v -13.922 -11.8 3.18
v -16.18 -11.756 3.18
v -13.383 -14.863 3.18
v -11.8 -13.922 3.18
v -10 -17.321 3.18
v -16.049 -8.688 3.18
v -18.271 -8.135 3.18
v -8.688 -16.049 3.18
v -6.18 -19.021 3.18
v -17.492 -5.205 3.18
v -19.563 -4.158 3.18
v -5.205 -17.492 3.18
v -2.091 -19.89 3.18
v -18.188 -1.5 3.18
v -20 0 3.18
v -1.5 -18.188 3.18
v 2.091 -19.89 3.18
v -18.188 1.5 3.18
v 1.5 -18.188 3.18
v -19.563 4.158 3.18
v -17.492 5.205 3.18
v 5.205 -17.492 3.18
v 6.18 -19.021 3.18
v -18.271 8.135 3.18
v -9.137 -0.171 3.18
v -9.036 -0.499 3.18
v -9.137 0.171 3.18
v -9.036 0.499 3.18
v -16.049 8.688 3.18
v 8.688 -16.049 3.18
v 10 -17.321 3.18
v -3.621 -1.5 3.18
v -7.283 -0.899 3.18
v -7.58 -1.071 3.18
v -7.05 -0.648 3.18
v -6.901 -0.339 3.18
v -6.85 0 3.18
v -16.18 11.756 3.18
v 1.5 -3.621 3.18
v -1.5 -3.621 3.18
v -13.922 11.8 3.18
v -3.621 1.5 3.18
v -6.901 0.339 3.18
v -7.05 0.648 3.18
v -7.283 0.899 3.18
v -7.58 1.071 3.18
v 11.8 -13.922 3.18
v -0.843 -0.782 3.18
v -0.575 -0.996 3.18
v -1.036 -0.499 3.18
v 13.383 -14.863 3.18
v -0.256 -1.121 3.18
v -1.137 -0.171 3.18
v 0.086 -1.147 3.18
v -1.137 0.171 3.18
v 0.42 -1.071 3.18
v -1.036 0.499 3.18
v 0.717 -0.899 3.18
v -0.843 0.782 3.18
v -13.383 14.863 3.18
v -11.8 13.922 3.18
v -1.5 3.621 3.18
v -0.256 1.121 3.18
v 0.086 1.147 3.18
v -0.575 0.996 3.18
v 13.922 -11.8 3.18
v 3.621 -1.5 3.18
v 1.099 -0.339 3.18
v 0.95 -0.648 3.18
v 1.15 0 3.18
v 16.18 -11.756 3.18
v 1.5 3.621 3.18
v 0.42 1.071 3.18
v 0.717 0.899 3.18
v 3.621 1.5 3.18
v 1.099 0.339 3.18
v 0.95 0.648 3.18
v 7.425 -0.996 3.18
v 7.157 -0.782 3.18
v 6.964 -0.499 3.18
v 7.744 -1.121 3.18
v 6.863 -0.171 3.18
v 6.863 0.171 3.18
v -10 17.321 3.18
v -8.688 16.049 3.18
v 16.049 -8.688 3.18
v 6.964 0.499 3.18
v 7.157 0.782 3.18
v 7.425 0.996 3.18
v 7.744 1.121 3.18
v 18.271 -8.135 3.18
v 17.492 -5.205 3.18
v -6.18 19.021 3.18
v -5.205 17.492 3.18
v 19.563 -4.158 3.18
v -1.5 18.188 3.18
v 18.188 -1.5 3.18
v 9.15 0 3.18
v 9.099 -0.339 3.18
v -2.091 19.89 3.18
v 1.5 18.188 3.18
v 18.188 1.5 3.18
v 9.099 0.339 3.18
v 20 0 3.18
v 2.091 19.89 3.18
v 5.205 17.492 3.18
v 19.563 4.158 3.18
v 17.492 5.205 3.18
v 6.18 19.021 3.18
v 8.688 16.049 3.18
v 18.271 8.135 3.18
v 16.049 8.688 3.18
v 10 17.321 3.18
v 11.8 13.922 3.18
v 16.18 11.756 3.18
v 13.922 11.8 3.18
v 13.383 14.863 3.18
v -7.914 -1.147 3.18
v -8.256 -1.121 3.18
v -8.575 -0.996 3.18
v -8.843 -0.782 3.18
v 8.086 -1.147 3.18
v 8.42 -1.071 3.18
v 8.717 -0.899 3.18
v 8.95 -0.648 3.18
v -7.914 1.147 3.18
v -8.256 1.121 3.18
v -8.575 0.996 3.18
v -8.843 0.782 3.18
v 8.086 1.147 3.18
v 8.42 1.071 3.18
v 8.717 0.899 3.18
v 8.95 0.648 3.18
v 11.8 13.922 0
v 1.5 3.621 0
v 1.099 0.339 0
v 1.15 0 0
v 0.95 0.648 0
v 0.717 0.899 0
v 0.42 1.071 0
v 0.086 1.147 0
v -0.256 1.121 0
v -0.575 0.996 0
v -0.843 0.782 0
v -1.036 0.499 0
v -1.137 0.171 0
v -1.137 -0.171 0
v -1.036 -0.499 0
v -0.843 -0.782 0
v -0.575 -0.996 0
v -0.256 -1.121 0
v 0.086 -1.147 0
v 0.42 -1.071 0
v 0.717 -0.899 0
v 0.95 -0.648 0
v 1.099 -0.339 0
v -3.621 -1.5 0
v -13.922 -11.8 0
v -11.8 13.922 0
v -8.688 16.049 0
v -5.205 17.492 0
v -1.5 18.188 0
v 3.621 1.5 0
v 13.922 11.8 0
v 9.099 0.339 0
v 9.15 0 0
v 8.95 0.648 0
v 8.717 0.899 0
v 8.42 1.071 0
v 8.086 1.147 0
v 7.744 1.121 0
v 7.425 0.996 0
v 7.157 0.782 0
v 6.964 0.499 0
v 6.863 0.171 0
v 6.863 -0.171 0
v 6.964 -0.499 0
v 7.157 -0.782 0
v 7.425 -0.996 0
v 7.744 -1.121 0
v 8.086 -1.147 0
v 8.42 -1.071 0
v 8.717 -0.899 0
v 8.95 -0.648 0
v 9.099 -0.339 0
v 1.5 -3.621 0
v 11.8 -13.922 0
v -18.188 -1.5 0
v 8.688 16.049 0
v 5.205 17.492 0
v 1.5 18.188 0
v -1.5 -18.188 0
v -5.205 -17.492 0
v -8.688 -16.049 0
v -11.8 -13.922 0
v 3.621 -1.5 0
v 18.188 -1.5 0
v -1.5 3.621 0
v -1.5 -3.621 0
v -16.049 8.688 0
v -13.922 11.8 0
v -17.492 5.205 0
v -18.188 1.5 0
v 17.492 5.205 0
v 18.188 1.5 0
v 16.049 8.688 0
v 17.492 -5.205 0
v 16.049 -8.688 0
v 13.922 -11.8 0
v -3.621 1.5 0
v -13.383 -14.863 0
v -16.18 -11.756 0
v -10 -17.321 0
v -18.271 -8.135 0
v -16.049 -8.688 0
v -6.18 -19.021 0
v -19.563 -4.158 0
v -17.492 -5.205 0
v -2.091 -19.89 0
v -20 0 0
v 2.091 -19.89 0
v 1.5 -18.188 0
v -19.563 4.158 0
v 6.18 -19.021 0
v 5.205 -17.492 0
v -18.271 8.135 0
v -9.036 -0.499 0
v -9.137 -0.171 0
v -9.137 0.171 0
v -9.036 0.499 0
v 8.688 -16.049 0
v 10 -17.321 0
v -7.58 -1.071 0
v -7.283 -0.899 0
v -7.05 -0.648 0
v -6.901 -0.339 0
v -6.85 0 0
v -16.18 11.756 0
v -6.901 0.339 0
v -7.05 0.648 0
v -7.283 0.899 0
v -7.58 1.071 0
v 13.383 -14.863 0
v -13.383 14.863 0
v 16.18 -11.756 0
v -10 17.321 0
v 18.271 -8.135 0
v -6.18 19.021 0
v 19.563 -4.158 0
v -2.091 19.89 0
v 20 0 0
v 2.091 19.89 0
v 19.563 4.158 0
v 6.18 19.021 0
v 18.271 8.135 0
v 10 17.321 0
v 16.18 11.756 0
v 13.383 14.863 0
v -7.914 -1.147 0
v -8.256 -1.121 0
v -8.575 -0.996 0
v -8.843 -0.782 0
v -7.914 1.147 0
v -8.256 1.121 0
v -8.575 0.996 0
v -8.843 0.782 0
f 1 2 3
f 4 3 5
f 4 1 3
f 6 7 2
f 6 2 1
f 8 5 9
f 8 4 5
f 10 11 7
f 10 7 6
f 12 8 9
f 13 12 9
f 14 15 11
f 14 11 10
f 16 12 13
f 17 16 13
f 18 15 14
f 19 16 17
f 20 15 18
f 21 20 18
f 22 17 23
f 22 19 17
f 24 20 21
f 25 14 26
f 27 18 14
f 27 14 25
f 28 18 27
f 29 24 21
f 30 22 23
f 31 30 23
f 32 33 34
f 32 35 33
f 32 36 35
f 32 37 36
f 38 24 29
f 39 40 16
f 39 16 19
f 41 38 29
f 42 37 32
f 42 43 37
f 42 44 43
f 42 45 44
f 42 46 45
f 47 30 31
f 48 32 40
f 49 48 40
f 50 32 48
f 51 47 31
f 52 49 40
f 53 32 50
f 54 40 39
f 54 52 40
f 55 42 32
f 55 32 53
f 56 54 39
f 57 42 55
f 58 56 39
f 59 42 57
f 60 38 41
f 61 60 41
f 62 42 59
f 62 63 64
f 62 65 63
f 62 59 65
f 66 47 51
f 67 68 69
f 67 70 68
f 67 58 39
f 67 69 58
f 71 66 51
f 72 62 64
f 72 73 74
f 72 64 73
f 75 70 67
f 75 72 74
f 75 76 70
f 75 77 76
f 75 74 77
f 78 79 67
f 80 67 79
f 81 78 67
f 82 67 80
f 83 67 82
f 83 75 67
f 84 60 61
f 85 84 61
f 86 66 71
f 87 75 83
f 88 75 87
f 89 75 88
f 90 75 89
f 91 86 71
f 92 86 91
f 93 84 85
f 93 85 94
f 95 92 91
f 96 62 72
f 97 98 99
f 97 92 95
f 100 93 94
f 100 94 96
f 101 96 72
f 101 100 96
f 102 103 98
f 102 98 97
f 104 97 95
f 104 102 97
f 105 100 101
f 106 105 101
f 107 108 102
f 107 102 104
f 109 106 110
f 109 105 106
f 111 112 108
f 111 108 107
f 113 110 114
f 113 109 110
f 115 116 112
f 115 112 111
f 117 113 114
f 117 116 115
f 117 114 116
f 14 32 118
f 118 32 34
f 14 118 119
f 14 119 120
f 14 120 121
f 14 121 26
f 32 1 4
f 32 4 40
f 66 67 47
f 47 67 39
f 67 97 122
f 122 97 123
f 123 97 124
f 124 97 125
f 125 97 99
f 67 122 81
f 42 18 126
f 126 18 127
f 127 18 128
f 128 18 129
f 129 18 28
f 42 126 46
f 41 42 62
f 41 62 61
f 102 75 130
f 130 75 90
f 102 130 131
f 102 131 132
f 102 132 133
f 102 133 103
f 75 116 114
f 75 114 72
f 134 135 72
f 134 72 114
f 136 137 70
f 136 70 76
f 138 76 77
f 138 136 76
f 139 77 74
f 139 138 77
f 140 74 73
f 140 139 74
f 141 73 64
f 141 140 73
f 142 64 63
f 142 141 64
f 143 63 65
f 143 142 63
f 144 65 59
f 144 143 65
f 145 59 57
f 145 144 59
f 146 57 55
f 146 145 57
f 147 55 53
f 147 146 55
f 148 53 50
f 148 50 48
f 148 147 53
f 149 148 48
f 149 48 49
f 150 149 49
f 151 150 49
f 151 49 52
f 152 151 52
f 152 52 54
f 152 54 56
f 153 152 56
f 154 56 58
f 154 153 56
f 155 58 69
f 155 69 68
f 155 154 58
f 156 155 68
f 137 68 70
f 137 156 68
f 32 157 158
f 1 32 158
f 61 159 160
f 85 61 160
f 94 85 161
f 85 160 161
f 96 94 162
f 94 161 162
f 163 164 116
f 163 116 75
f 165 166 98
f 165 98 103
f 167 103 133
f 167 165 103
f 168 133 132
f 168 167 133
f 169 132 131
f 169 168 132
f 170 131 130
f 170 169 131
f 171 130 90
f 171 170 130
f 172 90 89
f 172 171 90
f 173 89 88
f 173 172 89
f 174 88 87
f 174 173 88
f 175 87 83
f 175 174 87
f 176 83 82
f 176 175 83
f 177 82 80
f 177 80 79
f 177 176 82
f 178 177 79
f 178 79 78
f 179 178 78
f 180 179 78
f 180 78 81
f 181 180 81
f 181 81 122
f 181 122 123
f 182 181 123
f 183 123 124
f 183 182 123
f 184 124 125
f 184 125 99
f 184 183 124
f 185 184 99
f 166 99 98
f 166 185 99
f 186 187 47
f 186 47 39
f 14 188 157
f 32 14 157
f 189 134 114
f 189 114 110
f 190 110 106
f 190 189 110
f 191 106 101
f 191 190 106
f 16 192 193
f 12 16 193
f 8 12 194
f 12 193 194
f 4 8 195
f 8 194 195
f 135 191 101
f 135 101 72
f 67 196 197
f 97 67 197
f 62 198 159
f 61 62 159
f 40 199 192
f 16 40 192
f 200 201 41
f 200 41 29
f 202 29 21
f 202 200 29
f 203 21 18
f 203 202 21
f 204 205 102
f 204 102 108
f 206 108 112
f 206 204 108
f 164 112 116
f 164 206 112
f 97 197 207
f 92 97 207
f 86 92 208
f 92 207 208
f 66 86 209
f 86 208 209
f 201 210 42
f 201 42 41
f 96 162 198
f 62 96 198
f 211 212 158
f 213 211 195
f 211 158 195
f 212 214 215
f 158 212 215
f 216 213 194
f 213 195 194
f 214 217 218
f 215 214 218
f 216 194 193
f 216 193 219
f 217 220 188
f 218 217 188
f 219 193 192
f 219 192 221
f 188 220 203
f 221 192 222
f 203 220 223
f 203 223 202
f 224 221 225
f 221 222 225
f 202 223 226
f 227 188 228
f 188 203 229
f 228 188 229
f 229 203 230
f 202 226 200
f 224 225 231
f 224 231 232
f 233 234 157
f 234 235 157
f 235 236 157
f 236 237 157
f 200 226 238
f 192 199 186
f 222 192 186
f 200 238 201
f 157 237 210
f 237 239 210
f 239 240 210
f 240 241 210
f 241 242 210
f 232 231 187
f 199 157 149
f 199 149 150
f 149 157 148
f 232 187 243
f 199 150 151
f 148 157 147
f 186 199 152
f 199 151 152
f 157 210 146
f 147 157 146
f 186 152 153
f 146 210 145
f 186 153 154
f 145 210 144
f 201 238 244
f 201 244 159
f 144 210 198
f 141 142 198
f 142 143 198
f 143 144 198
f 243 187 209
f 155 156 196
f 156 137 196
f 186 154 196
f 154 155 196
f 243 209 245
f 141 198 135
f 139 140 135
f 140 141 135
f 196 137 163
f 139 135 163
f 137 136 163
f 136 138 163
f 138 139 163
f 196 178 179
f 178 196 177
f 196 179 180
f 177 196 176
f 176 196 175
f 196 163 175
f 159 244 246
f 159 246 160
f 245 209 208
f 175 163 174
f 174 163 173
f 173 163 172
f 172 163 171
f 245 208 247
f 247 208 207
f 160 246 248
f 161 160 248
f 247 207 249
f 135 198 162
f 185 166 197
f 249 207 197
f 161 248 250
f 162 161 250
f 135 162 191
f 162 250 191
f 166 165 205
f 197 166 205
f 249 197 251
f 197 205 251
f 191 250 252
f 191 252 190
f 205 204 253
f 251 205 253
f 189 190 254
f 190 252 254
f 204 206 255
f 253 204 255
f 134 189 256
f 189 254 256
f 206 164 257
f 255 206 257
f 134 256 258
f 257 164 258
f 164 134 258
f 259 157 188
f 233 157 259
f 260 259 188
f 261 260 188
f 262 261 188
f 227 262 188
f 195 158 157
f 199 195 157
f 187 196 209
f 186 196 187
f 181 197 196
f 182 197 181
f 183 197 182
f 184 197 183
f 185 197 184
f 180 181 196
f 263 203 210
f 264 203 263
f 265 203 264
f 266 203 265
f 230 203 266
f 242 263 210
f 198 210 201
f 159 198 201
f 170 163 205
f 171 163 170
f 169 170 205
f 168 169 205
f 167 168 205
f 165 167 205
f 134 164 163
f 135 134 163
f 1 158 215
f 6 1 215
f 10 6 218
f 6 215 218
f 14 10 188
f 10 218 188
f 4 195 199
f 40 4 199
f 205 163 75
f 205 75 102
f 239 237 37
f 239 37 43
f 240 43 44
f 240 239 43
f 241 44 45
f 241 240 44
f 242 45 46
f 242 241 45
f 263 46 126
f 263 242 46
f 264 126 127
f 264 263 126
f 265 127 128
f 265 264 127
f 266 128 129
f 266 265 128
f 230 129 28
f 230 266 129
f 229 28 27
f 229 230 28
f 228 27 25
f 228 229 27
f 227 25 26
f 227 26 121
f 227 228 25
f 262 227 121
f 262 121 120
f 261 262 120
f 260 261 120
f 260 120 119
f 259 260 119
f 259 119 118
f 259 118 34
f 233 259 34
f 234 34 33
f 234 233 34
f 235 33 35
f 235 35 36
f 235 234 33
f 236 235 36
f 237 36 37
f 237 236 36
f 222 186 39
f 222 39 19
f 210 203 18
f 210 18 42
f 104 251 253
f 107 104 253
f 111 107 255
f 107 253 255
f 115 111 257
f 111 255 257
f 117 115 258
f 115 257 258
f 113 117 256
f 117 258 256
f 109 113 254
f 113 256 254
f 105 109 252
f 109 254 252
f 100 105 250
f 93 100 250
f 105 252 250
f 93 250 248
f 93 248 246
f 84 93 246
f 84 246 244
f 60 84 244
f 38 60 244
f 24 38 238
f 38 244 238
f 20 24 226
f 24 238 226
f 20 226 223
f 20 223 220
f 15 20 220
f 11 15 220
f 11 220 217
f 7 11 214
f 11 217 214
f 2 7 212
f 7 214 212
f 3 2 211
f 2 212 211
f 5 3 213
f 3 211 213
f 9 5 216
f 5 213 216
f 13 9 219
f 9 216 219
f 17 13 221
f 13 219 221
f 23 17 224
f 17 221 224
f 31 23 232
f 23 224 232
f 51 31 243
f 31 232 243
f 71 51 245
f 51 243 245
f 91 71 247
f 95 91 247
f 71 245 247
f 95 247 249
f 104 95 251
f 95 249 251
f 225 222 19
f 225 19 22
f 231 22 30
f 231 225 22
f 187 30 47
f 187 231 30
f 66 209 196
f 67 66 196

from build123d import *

# Parameters (mm, degrees)
SKETCH1_R           = 20
SKETCH1_R_2         = 1.15
BOSS_EXTRUDE1_DEPTH = 3.18


with BuildPart() as part:
    # Sketch1 → Boss-Extrude1 (new body)
    with BuildSketch(Plane.XY):
        Circle(SKETCH1_R)
        Circle(SKETCH1_R_2, mode=Mode.SUBTRACT)
        with Locations((-8, 0)):
            Circle(SKETCH1_R_2, mode=Mode.SUBTRACT)
        with Locations((8, 0)):
            Circle(SKETCH1_R_2, mode=Mode.SUBTRACT)
        with BuildLine():
            Line((-1.5, 18.188251703), (-1.5, 3.621320344))
            Line((-1.5, 3.621320344), (-11.800375945, 13.921696289))
            ThreePointArc((-11.800375945, 13.921696289), (-6.983972641, 16.860801468), (-1.5, 18.188251703))
        make_face(mode=Mode.SUBTRACT)
        with BuildLine():
            Line((-1.5, -3.621320344), (-1.5, -18.188251703))
            ThreePointArc((-1.5, -18.188251703), (-6.983972641, -16.860801468), (-11.800375945, -13.921696289))
            Line((-11.800375945, -13.921696289), (-1.5, -3.621320344))
        make_face(mode=Mode.SUBTRACT)
        with BuildLine():
            Line((1.5, -3.621320344), (1.5, -18.188251703))
            ThreePointArc((1.5, -18.188251703), (6.983972641, -16.860801468), (11.800375945, -13.921696289))
            Line((11.800375945, -13.921696289), (1.5, -3.621320344))
        make_face(mode=Mode.SUBTRACT)
        with BuildLine():
            Line((1.5, 18.188251703), (1.5, 3.621320344))
            Line((1.5, 3.621320344), (11.800375945, 13.921696289))
            ThreePointArc((11.800375945, 13.921696289), (6.983972641, 16.860801468), (1.5, 18.188251703))
        make_face(mode=Mode.SUBTRACT)
        with BuildLine():
            Line((-18.188251703, 1.5), (-3.621320344, 1.5))
            Line((-3.621320344, 1.5), (-13.921696289, 11.800375945))
            ThreePointArc((-13.921696289, 11.800375945), (-16.860801468, 6.983972641), (-18.188251703, 1.5))
        make_face(mode=Mode.SUBTRACT)
        with BuildLine():
            Line((-18.188251703, -1.5), (-3.621320344, -1.5))
            Line((-3.621320344, -1.5), (-13.921696289, -11.800375945))
            ThreePointArc((-13.921696289, -11.800375945), (-16.860801468, -6.983972641), (-18.188251703, -1.5))
        make_face(mode=Mode.SUBTRACT)
        with BuildLine():
            Line((3.621320344, 1.5), (18.188251703, 1.5))
            ThreePointArc((18.188251703, 1.5), (16.860801468, 6.983972641), (13.921696289, 11.800375945))
            Line((13.921696289, 11.800375945), (3.621320344, 1.5))
        make_face(mode=Mode.SUBTRACT)
        with BuildLine():
            Line((3.621320344, -1.5), (18.188251703, -1.5))
            ThreePointArc((18.188251703, -1.5), (16.860801468, -6.983972641), (13.921696289, -11.800375945))
            Line((13.921696289, -11.800375945), (3.621320344, -1.5))
        make_face(mode=Mode.SUBTRACT)
    extrude(amount=BOSS_EXTRUDE1_DEPTH)


solid = part.part
